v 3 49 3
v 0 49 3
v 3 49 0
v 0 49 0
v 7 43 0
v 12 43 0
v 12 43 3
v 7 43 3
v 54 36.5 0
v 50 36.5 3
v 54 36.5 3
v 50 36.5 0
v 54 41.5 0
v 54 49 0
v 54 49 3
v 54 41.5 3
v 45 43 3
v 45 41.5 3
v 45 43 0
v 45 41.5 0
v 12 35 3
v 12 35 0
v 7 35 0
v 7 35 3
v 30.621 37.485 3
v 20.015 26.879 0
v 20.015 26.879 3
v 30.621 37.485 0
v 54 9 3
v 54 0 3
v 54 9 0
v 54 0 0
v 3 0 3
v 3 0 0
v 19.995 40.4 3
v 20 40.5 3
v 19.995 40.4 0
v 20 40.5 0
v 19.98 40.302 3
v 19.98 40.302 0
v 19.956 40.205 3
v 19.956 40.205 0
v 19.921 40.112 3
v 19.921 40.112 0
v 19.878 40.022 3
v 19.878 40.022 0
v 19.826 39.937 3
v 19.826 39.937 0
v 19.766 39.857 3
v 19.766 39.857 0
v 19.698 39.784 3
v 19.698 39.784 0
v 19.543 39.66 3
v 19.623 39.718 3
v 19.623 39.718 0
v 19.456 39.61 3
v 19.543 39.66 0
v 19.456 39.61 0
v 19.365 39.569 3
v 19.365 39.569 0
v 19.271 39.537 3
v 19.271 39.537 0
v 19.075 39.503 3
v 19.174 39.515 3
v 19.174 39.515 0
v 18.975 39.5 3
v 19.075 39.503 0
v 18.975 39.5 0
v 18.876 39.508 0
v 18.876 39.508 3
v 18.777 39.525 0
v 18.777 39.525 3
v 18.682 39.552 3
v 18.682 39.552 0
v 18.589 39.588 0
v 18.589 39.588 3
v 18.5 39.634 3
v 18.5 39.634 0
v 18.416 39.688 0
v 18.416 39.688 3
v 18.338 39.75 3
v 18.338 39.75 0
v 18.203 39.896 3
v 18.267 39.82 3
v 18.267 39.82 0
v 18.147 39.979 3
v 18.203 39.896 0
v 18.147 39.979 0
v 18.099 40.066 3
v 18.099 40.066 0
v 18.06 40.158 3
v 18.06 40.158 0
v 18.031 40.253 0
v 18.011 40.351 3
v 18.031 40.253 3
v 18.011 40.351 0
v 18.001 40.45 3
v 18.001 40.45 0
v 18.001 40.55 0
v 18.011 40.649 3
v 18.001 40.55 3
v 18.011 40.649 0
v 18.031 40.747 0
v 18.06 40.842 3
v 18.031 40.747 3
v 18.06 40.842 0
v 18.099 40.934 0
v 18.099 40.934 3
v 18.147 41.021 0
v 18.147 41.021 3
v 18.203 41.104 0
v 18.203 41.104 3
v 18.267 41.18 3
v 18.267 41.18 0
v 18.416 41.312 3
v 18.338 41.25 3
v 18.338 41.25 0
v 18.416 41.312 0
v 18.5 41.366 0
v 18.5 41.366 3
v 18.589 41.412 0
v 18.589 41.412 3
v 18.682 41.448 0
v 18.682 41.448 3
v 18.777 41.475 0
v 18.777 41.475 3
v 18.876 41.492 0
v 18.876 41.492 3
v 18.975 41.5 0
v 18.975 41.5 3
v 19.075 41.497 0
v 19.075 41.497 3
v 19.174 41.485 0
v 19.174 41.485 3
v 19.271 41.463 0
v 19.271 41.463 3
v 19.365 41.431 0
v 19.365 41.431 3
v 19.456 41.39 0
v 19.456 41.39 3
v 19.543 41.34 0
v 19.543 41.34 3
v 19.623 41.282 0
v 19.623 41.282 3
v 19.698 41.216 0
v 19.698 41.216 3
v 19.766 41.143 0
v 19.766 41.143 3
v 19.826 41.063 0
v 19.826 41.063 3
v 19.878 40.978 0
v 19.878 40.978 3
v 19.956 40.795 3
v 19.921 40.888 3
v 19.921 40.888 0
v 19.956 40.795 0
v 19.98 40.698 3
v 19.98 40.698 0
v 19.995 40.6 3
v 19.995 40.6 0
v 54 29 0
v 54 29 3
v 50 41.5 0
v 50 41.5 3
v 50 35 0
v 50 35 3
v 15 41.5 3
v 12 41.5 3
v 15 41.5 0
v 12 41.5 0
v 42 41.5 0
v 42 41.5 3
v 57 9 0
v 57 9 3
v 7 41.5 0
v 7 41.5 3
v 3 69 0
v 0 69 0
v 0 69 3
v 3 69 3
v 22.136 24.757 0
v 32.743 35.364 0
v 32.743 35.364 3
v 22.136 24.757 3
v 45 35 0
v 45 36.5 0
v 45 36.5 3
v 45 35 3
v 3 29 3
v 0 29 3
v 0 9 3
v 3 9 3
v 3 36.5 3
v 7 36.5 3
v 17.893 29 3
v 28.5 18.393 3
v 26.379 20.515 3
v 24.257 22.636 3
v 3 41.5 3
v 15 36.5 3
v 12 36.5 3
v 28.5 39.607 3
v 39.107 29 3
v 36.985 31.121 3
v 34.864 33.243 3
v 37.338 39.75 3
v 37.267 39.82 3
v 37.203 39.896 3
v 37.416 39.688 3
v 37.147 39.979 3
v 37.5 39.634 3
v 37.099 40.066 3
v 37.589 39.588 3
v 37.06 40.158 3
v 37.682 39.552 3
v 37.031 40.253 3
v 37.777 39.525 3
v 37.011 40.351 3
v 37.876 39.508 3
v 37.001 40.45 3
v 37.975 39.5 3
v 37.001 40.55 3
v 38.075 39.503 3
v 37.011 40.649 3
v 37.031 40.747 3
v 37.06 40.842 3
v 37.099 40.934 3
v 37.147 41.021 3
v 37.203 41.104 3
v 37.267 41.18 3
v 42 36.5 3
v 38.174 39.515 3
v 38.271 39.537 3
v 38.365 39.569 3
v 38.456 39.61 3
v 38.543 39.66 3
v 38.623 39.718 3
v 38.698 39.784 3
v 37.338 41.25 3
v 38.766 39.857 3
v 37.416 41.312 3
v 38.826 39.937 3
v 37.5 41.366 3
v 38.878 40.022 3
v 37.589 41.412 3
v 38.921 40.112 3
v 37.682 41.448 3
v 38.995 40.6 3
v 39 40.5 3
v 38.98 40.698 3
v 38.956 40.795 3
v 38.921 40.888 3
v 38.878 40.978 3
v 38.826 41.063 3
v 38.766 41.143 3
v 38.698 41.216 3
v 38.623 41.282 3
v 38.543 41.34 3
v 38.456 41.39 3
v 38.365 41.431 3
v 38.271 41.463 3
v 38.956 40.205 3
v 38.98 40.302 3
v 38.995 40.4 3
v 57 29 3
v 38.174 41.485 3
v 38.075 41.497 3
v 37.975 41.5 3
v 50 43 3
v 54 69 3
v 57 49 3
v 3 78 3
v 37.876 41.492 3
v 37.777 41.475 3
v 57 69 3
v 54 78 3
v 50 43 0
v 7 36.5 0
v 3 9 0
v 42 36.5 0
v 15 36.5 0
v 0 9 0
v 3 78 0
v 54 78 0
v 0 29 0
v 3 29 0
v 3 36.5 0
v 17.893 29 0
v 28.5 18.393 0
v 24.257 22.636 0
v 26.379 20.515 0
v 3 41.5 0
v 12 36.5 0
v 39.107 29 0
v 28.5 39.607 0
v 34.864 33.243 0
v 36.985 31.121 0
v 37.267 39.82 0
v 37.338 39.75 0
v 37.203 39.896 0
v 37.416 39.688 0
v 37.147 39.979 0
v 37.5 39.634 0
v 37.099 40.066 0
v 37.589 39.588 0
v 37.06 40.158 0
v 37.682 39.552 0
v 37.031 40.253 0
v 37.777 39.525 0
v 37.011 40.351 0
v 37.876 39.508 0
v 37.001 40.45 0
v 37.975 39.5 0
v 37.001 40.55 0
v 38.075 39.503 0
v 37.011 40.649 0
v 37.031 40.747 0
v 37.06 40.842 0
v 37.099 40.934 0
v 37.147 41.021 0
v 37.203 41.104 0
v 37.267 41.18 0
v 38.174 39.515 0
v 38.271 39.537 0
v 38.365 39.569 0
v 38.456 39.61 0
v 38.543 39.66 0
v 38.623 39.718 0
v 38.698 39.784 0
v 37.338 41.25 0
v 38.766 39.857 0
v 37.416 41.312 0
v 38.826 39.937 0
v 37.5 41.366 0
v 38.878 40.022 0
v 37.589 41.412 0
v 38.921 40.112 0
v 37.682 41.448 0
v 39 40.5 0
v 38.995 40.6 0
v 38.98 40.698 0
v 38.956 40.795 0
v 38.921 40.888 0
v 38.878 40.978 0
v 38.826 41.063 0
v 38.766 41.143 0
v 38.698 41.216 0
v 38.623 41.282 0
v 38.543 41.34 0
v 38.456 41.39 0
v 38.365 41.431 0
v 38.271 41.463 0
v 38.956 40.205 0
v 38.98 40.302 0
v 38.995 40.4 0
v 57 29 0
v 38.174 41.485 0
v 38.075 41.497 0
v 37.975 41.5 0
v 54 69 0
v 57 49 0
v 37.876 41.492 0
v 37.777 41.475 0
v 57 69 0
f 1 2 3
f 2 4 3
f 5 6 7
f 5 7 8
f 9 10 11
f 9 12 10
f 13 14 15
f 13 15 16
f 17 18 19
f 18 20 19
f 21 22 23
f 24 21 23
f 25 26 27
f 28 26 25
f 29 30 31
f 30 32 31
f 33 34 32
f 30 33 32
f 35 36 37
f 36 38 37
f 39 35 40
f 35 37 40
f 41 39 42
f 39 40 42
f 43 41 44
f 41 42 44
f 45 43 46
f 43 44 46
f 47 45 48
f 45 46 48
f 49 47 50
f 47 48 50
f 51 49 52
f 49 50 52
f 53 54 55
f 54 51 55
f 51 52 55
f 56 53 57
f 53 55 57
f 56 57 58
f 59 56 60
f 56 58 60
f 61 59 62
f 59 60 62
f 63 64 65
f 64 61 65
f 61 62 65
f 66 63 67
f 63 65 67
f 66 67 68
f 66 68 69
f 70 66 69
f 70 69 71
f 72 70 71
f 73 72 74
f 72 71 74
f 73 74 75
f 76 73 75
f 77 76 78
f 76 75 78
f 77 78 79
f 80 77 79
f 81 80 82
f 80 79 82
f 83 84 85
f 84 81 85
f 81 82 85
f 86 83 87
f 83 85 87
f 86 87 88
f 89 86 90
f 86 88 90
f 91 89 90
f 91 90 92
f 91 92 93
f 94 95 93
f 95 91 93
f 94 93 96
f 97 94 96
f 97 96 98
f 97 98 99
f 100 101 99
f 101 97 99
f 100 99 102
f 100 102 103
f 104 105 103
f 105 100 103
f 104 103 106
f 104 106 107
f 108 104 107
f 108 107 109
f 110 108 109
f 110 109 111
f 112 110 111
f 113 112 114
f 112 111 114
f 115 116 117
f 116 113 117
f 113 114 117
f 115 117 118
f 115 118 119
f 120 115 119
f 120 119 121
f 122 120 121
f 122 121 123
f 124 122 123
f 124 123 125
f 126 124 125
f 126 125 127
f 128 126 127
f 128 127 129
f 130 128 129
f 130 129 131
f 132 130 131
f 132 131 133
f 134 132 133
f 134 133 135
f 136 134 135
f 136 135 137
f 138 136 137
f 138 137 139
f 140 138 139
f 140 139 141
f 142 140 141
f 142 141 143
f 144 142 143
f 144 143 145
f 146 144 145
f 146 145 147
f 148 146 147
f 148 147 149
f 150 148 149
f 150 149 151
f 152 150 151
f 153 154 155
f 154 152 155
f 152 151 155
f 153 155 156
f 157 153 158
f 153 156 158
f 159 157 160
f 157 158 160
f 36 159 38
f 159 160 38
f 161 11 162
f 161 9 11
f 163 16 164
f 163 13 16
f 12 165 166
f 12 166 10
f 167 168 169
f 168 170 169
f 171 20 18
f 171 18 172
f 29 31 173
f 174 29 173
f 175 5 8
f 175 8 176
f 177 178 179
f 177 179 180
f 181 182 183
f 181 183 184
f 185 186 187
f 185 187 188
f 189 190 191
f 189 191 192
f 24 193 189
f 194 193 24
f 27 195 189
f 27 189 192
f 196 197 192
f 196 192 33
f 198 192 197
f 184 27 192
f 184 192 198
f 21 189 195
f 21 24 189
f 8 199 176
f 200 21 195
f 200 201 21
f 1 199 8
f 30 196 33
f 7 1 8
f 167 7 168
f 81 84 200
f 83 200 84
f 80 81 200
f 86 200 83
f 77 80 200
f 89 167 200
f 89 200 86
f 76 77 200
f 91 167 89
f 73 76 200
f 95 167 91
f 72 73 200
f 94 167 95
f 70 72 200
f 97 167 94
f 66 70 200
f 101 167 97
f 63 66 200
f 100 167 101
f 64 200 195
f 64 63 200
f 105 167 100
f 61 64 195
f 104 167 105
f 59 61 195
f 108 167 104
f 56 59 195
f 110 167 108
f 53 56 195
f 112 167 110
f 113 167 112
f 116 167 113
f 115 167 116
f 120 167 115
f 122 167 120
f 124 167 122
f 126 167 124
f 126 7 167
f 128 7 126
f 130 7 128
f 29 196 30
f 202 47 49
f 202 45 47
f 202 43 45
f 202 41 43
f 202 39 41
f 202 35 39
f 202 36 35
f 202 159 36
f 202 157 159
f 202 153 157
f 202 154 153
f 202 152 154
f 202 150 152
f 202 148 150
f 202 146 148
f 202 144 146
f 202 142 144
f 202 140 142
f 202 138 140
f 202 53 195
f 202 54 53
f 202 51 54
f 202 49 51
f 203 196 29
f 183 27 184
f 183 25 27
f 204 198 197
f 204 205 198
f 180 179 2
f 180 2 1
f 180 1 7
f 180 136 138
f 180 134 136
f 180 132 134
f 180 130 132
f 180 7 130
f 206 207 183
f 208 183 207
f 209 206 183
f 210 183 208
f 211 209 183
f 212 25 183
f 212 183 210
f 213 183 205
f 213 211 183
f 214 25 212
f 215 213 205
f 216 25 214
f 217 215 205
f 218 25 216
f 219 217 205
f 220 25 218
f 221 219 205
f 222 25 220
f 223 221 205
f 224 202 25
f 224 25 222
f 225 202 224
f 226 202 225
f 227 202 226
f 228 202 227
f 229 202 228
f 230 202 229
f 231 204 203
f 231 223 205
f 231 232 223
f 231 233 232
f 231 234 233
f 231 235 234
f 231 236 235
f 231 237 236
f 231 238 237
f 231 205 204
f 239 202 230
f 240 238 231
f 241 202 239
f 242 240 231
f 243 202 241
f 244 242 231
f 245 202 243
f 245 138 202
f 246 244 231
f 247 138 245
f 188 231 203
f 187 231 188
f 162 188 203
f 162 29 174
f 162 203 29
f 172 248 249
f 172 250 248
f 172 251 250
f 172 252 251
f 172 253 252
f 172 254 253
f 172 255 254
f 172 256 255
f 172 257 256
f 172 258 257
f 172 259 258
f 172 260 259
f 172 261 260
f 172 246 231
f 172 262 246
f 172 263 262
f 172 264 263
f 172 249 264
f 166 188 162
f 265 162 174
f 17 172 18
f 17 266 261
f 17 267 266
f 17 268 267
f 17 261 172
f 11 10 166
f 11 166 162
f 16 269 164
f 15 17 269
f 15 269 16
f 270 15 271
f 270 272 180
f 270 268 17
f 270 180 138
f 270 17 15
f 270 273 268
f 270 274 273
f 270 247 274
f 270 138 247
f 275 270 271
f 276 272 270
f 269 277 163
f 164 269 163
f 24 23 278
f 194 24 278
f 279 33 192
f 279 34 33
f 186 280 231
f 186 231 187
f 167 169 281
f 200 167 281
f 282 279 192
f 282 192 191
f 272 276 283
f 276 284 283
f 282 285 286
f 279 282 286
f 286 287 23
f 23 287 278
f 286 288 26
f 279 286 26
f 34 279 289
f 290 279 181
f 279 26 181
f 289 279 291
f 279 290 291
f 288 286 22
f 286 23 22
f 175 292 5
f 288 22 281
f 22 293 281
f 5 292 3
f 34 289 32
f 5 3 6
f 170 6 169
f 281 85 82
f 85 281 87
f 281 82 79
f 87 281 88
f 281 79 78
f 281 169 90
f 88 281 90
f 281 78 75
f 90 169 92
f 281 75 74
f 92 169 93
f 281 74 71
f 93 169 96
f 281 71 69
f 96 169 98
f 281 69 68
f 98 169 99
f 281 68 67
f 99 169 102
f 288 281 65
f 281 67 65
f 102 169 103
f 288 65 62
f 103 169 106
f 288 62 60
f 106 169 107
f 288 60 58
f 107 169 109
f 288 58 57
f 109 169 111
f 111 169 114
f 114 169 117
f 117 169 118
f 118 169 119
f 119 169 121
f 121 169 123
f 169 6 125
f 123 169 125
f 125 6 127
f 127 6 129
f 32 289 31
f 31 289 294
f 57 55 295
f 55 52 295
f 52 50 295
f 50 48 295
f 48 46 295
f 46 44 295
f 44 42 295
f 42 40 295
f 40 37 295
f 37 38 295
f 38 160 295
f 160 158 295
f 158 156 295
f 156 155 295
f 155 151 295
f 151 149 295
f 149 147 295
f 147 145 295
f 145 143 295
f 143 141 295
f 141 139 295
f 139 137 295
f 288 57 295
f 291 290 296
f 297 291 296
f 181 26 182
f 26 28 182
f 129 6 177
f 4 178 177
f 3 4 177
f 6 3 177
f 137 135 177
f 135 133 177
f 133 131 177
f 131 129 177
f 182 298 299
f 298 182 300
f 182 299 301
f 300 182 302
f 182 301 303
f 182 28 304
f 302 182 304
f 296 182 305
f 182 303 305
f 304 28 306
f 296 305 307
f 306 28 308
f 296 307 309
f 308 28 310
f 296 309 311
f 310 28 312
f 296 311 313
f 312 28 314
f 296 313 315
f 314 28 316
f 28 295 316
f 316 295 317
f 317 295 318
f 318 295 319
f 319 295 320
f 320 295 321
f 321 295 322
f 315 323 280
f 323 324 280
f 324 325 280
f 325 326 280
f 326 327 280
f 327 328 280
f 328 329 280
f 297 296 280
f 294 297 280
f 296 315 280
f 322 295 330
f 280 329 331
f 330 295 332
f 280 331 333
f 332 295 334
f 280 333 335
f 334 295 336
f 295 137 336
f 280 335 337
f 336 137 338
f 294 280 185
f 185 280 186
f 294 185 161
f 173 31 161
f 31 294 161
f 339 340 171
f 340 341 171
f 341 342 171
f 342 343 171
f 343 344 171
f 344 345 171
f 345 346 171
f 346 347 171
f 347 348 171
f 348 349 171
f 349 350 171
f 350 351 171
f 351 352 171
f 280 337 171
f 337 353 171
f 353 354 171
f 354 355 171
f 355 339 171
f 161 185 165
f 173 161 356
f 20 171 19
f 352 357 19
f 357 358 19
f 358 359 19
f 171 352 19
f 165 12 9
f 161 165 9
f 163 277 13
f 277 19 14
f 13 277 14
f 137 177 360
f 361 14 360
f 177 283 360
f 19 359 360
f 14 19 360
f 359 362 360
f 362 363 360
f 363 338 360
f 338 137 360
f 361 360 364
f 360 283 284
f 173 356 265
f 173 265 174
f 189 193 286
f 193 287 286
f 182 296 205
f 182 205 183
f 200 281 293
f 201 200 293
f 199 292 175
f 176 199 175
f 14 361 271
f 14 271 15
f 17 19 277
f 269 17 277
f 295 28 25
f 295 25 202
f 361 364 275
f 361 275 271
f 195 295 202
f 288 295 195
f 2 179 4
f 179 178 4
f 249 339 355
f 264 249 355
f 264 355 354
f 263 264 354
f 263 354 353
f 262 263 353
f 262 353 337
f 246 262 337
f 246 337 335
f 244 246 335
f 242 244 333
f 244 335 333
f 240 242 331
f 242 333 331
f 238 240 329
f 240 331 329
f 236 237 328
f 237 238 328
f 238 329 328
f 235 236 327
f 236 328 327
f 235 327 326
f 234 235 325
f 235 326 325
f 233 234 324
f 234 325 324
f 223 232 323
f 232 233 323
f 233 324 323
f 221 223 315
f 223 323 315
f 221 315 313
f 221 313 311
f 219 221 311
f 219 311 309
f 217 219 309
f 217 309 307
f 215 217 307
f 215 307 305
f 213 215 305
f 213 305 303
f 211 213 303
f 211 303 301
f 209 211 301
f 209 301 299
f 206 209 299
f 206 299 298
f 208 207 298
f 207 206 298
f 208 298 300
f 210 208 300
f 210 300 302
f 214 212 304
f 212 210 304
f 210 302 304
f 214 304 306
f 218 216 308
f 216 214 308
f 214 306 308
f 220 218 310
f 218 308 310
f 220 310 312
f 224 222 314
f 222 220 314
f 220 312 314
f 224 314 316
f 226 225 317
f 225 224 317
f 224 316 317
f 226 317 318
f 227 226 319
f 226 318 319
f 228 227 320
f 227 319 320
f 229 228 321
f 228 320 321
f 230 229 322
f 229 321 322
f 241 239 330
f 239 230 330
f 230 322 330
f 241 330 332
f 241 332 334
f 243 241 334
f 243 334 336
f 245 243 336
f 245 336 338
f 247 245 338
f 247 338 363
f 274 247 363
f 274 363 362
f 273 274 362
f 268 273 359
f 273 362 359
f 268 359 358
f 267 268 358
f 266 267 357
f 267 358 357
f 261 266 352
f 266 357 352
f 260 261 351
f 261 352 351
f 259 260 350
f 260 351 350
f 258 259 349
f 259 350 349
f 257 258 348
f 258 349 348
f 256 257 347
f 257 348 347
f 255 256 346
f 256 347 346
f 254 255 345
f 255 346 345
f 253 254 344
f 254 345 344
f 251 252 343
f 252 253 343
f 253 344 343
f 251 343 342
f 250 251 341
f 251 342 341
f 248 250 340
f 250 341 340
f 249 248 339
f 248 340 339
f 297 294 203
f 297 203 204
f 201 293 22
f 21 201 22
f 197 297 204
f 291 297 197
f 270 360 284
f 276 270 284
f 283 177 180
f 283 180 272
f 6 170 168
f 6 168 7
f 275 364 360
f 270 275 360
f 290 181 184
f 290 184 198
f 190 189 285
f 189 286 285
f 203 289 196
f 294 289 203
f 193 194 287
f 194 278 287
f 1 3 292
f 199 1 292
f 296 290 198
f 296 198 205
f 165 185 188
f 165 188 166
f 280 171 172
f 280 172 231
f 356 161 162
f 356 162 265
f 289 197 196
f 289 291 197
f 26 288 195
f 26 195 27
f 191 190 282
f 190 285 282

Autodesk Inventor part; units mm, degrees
ref_plane "YZ Plane" through (0, 0, 0) normal (1, 0, 0) x (0, 1, 0)
ref_plane "XZ Plane" through (0, 0, 0) normal (0, 1, 0) x (-1, 0, 0)
ref_plane "XY Plane" through (0, 0, 0) normal (0, 0, 1) x (1, 0, 0)
sketch "Sketch1" plane through (0, 0, 0) normal (0, 0, 1) x (1, 0, 0)
  line L0 (0, 69) -> (3, 69)
  line L1 (3, 69) -> (3, 78)
  line L2 (3, 0) -> (3, 9)
  line L3 (3, 9) -> (0, 9)
  line L4 (0, 49) -> (3, 49)
  line L5 (3, 29) -> (0, 29)
  line L6 (15, 41.5) -> (15, 36.5)
  line L7 (12, 41.5) -> (12, 43)
  line L8 (12, 43) -> (7, 43)
  line L9 (7, 43) -> (7, 41.5)
  line L10 (12, 36.5) -> (12, 35)
  line L11 (12, 35) -> (7, 35)
  line L12 (7, 35) -> (7, 36.5)
  line L13 (0, 69) -> (0, 49)
  line L14 (0, 29) -> (0, 9)
  line L15 (3, 49) -> (3, 41.5)
  line L16 (3, 36.5) -> (3, 29)
  line L17 (15, 36.5) -> (12, 36.5)
  line L18 (7, 36.5) -> (3, 36.5)
  line L19 (3, 41.5) -> (7, 41.5)
  line L20 (12, 41.5) -> (15, 41.5)
  line L21 (57, 69) -> (54, 69)
  line L22 (54, 69) -> (54, 78)
  line L23 (54, 0) -> (54, 9)
  line L24 (54, 9) -> (57, 9)
  line L25 (57, 49) -> (54, 49)
  line L26 (54, 29) -> (57, 29)
  line L27 (42, 41.5) -> (42, 36.5)
  line L28 (45, 41.5) -> (45, 43)
  line L29 (45, 43) -> (50, 43)
  line L30 (50, 43) -> (50, 41.5)
  line L31 (45, 36.5) -> (45, 35)
  line L32 (45, 35) -> (50, 35)
  line L33 (50, 35) -> (50, 36.5)
  line L34 (57, 69) -> (57, 49)
  line L35 (57, 29) -> (57, 9)
  line L36 (54, 49) -> (54, 41.5)
  line L37 (54, 36.5) -> (54, 29)
  line L38 (42, 36.5) -> (45, 36.5)
  line L39 (50, 36.5) -> (54, 36.5)
  line L40 (54, 41.5) -> (50, 41.5)
  line L41 (45, 41.5) -> (42, 41.5)
  line L42 (3, 0) -> (54, 0)
  line L43 (54, 78) -> (3, 78)
  line L44 (24.2574, 22.636) -> (34.864, 33.2426)
  line L45 (34.864, 33.2426) -> (32.7426, 35.364)
  line L46 (32.7426, 35.364) -> (22.136, 24.7574)
  line L47 (22.136, 24.7574) -> (24.2574, 22.636)
  line L48 (20.0147, 26.8787) -> (30.6213, 37.4853)
  line L49 (30.6213, 37.4853) -> (28.5, 39.6066)
  line L50 (28.5, 39.6066) -> (17.8934, 29)
  line L51 (17.8934, 29) -> (20.0147, 26.8787)
  line L52 (28.5, 18.3934) -> (39.1066, 29)
  line L53 (39.1066, 29) -> (36.9853, 31.1213)
  line L54 (36.9853, 31.1213) -> (26.3787, 20.5147)
  line L55 (26.3787, 20.5147) -> (28.5, 18.3934)
  line L56 (24.2574, 22.636) -> (34.864, 33.2426)
  line L57 (34.864, 33.2426) -> (32.7426, 35.364)
  line L58 (32.7426, 35.364) -> (22.136, 24.7574)
  line L59 (22.136, 24.7574) -> (24.2574, 22.636)
  circle A0 centre (19, 40.5) radius 1
  circle A1 centre (38, 40.5) radius 1
  point P0 (0, 0)
  point P1 (57, 56.3821)
  point P2 (13.5, 36.5)
  point P3 (43.5, 41.5)
  dimension "d58" = 3
  dimension "d59" = 4
  dimension "d60" = 5
  dimension "d61" = 3
  dimension "d62" = 3
  dimension "d63" = 4
  dimension "d64" = 5
  dimension "d65" = 3
  dimension "d66" = 3
  dimension "d77" = 6
  dimension "d80" = 6
  dimension "d83" = 2
  dimension "d84" = 2
  dimension "d85" = 4
  dimension "d86" = 4
  dimension "d87" = 4
  dimension "d88" = 4
extrude "Extrusion1" add sketch "Sketch1" along normal blind 3
properties part number "Motor_Mount_Front"
